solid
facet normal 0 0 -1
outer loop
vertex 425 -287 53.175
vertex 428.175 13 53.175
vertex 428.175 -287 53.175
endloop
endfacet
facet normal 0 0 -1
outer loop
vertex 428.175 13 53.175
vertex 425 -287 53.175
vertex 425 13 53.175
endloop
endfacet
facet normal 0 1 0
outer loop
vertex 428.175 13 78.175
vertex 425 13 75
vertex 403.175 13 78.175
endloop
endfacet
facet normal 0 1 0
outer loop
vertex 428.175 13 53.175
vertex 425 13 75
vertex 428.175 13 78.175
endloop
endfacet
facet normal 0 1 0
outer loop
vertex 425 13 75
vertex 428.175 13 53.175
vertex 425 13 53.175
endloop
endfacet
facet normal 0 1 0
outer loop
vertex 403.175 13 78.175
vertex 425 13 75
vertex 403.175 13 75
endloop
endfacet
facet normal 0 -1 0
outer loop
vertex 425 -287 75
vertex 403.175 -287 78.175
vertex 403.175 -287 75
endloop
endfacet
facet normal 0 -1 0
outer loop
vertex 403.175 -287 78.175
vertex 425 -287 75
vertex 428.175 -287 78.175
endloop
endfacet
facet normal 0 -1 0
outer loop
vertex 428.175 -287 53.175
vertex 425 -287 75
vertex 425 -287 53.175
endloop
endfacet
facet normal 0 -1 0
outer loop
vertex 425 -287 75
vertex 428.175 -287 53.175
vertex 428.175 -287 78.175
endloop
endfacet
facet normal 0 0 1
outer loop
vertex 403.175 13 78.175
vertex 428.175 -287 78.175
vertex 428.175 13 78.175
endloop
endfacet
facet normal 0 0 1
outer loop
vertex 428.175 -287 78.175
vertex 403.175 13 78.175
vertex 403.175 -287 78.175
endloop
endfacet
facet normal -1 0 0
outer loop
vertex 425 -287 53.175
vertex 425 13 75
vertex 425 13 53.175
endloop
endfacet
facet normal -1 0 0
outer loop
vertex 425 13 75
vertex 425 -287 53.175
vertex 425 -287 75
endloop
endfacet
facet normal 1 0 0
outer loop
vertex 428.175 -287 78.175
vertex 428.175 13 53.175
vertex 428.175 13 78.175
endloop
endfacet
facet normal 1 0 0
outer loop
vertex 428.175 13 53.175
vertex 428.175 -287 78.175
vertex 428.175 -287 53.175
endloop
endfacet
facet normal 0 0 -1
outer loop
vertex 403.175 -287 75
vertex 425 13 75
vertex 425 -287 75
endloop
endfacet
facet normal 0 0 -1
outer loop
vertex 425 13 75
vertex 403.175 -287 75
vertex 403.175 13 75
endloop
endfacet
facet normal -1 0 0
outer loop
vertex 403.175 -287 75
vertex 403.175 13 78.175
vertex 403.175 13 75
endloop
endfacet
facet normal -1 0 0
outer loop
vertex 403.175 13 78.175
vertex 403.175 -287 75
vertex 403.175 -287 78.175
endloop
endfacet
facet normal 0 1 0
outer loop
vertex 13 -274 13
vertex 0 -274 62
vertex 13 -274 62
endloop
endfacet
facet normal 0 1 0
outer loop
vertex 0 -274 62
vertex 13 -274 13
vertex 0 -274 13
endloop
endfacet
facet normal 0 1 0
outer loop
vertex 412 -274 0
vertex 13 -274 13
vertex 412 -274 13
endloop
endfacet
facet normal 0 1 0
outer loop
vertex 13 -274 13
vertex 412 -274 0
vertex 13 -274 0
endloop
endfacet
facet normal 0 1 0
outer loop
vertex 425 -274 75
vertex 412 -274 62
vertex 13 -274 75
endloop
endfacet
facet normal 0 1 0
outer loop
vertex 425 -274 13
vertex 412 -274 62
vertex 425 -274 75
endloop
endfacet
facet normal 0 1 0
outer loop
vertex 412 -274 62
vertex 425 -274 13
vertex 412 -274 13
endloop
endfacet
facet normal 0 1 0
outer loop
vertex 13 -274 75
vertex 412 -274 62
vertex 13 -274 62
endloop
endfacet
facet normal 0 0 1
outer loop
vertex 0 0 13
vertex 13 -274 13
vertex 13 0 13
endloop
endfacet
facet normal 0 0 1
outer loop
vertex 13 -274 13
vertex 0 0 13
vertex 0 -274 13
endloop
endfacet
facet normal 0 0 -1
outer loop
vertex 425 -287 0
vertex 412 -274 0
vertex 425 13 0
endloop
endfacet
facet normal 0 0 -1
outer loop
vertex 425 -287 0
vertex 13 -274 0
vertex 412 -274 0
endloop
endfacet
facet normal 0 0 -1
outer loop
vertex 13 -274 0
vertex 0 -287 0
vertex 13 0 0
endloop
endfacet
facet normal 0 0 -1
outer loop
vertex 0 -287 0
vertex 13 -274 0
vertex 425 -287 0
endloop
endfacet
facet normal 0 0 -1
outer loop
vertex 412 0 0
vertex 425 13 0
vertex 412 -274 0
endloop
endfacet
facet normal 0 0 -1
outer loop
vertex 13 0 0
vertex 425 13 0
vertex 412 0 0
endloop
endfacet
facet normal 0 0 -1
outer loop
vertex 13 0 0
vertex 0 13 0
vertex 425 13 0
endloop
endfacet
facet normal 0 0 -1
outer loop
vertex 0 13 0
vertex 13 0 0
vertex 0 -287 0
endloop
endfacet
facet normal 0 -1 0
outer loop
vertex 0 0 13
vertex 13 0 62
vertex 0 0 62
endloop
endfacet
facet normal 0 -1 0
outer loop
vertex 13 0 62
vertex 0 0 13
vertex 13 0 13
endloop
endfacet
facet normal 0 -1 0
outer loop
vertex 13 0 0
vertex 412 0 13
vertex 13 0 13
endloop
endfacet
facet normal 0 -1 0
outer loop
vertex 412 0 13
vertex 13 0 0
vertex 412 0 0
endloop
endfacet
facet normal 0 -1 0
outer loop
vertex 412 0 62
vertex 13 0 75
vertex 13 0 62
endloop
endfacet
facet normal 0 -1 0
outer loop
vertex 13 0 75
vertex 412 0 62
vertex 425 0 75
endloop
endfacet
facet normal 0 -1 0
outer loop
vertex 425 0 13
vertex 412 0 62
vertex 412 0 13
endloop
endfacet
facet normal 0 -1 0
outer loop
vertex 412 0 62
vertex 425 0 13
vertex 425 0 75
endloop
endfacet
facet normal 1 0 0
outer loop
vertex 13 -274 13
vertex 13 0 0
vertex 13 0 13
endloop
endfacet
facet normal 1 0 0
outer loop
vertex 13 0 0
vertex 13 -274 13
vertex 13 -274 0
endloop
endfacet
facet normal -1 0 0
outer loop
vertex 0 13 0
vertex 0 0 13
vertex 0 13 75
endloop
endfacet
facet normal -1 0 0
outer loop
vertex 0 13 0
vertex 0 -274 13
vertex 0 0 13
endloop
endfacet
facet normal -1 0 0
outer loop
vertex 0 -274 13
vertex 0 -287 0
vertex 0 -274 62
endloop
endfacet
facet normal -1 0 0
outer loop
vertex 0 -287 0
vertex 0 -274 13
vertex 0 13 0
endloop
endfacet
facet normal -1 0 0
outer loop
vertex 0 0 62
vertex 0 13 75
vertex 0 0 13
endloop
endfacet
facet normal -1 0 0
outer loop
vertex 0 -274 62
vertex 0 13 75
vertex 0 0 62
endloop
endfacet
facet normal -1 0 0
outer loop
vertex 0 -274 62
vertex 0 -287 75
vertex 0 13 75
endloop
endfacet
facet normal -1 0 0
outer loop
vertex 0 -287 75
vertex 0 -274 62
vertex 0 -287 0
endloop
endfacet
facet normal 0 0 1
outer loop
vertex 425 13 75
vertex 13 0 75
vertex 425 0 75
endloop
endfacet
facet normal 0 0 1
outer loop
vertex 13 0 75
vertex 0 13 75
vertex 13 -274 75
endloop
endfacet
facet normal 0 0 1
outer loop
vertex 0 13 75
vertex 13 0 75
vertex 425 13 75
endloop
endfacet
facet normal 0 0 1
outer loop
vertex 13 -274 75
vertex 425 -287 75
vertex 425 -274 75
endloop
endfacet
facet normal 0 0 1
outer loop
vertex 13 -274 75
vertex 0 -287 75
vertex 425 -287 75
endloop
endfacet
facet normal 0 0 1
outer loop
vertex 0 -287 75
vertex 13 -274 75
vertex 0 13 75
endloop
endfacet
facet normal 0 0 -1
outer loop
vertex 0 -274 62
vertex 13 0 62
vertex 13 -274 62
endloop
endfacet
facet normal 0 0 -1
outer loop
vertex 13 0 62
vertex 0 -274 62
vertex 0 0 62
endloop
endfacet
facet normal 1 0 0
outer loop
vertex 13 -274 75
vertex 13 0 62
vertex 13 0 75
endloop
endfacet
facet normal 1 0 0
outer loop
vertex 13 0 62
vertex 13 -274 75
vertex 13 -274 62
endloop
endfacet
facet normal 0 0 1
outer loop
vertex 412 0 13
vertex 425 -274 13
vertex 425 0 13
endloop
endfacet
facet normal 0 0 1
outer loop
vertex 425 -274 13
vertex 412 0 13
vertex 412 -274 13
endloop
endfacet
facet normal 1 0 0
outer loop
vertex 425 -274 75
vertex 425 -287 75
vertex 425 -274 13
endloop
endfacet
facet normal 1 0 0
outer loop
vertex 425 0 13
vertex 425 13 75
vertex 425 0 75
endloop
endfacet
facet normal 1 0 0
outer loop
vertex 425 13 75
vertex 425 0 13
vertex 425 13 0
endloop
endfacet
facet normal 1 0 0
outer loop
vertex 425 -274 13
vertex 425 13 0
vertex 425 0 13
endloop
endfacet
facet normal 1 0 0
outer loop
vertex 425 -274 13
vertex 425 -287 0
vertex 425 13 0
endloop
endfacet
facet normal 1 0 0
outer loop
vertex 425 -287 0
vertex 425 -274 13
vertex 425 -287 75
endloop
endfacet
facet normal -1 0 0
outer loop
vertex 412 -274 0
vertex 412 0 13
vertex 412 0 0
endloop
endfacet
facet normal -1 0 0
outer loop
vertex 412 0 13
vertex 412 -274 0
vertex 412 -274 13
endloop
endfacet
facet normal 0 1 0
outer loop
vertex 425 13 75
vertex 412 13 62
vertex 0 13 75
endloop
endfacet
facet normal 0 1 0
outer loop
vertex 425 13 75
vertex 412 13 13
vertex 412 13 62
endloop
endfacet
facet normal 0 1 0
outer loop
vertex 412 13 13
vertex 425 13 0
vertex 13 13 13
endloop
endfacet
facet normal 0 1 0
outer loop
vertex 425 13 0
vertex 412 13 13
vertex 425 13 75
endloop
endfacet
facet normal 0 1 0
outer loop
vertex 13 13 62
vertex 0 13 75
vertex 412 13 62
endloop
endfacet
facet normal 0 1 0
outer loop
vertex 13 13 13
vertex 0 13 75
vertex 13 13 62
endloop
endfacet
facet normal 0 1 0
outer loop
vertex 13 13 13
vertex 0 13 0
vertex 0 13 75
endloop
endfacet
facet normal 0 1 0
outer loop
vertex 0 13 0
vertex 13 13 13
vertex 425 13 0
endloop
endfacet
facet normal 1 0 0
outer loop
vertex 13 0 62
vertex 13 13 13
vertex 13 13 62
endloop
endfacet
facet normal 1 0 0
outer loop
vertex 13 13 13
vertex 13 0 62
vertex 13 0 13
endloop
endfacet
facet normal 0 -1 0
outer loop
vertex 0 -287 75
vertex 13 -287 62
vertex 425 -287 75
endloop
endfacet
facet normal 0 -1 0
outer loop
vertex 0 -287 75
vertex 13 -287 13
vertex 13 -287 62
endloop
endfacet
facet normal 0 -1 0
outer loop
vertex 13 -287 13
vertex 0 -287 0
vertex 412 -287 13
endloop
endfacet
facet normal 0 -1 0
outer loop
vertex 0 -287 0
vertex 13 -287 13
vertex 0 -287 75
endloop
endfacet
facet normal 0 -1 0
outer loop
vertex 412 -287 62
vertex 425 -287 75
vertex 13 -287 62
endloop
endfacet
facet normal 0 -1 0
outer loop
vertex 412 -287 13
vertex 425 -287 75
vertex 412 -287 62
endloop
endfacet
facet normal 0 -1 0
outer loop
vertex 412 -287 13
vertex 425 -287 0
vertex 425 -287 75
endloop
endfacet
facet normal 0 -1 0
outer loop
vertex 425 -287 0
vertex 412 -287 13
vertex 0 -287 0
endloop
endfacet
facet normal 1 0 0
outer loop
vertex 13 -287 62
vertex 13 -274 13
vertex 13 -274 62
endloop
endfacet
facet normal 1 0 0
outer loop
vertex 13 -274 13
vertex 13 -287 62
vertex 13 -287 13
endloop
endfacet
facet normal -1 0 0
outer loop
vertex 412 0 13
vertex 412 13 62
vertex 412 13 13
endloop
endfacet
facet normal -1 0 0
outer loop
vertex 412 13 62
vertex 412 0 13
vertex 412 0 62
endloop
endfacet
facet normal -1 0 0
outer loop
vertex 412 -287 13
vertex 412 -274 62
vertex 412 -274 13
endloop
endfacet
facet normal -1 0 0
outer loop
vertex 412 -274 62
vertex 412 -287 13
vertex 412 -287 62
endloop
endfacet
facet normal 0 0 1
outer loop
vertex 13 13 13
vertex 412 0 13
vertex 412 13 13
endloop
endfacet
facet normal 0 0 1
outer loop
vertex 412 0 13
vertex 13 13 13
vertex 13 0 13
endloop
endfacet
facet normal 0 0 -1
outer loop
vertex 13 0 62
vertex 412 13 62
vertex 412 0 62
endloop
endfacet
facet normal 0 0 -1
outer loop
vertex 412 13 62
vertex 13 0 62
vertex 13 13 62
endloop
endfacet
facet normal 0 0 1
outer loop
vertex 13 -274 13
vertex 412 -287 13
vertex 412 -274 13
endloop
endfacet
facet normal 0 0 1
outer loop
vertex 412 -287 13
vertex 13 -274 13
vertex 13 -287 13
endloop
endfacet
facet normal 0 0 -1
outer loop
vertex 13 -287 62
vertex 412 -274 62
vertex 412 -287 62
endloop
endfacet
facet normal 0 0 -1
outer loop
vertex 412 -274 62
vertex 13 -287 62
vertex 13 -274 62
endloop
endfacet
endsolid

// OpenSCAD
// file: material.scad
module tube(size, length)
{
	cube([length, size, size]);
}

module angle(size, thickness, length)
{
	s = size;
	t = thickness;
	l = length;

	union()
	{
		cube([s, t, l]);
		cube([t, s, l]);
	}
}

angle(18, 3, 300);
// main file
use<material.scad>

module base(tubesize, d)
{
	ts = tubesize;
	w = d[0];
	l = d[1];
	h = d[2];
	t = d[3];

	//translate([ts,0,0]) rotate([0,0,90]) 
	union()
	{
		translate([ts,0,0])
			tube(ts, l-(ts*2));
		translate([ts,0,h-ts])
			tube(ts, l-(ts*2));
		translate([ts,-(w-ts),0])
			tube(ts, l-(ts*2));
		translate([ts,-(w-ts),h-ts])
			tube(ts, l-(ts*2));

		union() color([255,0,0])
		{
			rotate([0,0,270])
				tube(ts, w-(ts*2));
			translate([0,0,h-ts])
				rotate([0,0,270])
				tube(ts, w-(ts*2));
			translate([l-ts,0,0])
				rotate([0,0,270])
				tube(ts, w-(ts*2));
			translate([l+t,-w+ts,h+t])
				rotate([270,90,0])
				angle(25,t,w);
		}

		rotate([0,270,270]) union() color([0,0,255])
		{
			translate([0,0,0])
				tube(ts, h);
			translate([0,0,-(w-ts)])
				tube(ts, h);
			translate([0,l-ts,0])
				tube(ts, h);
			translate([0,l-ts,-(w-ts)])
				tube(ts, h);
		}
	}
}

base(tubesize=13, d=[300,425,75,3.175]);
